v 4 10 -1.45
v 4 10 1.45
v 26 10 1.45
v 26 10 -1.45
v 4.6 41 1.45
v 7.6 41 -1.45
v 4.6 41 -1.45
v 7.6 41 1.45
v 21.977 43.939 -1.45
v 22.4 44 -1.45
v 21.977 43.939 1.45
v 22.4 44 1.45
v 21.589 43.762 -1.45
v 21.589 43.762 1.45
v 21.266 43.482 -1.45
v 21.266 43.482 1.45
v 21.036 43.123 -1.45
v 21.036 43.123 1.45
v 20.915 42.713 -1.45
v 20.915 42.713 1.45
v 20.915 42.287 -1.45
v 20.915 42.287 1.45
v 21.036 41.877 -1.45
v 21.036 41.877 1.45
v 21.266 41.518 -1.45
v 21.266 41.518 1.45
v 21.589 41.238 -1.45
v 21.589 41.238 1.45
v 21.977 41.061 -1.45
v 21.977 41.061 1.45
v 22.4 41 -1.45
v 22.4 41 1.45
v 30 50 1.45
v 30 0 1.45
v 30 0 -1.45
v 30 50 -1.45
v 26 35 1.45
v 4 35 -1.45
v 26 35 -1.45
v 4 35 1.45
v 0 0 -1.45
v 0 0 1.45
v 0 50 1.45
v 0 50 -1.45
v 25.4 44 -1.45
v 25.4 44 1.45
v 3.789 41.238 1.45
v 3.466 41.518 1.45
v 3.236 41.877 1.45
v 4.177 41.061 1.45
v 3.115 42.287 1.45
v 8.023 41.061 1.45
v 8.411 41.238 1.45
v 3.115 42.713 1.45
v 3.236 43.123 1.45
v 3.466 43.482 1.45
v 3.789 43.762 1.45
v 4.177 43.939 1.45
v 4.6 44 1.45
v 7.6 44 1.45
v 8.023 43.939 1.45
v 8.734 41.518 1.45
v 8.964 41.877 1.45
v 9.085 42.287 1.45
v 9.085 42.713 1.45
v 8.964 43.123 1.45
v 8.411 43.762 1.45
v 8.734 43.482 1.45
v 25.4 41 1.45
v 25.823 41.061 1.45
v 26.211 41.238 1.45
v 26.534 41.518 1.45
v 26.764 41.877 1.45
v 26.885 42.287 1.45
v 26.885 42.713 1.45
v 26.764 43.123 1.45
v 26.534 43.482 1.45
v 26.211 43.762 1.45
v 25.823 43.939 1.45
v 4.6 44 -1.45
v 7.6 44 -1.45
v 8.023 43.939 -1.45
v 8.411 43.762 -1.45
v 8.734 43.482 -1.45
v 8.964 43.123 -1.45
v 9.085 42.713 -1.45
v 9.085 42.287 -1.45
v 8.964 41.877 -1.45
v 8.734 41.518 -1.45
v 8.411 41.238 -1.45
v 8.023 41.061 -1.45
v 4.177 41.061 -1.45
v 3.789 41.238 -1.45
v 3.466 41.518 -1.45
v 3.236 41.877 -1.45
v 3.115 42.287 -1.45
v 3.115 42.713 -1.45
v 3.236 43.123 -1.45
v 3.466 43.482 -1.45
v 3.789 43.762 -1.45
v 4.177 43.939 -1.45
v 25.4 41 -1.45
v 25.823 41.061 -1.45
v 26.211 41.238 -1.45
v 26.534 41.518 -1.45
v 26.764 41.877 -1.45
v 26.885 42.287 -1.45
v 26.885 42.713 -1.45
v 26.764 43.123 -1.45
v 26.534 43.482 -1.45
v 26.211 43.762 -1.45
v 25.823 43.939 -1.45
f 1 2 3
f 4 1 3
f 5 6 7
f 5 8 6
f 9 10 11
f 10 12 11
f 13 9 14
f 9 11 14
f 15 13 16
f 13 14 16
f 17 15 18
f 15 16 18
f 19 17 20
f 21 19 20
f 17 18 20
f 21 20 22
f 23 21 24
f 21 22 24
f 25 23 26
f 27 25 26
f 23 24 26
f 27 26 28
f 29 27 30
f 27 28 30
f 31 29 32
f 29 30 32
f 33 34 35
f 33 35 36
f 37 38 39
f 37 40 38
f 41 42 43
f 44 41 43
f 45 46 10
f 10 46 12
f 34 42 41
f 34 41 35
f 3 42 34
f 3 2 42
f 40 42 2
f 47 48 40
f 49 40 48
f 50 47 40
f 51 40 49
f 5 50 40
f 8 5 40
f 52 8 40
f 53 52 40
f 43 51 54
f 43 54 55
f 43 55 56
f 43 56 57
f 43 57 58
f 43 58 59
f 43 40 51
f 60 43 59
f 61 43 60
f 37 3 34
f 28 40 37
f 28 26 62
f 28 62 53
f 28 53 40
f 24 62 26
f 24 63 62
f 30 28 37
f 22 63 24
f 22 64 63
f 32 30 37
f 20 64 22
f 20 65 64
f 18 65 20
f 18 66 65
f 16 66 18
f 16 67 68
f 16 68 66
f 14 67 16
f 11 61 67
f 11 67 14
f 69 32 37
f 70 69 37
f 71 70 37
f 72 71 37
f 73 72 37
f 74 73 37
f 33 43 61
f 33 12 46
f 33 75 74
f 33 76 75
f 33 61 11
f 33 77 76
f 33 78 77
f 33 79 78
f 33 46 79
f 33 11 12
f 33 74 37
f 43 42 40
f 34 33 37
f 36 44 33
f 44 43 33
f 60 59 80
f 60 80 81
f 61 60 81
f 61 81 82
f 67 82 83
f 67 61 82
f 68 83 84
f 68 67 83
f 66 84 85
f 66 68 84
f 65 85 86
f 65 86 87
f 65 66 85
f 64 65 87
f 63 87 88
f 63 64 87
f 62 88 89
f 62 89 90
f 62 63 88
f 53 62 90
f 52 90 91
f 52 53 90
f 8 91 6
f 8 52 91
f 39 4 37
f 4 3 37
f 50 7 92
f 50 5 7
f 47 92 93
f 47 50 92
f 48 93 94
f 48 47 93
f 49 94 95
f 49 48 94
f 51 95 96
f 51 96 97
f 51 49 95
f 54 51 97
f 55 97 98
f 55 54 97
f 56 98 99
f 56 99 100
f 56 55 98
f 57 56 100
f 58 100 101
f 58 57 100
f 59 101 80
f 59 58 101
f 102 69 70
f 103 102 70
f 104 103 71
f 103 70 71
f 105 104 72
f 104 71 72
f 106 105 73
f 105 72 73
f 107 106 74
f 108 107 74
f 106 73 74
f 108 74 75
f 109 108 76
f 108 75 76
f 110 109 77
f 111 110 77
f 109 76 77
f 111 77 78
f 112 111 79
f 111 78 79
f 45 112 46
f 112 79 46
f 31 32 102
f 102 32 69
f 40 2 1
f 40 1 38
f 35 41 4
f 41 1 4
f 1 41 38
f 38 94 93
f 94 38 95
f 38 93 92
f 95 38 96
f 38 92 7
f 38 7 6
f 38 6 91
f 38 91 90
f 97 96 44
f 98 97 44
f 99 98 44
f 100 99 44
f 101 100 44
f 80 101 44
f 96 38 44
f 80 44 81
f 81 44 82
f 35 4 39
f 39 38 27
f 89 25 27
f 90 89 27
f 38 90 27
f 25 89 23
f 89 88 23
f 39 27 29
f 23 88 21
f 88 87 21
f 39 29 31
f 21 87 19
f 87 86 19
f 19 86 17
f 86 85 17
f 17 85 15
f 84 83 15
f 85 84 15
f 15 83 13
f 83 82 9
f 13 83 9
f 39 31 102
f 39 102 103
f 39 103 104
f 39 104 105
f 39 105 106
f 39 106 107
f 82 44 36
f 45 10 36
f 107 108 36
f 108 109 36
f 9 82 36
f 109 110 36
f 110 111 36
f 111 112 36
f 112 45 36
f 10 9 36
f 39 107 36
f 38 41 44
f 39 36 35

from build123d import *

# Parameters (mm, degrees)
SKETCH1_W           = 30
SKETCH1_H           = 50
SKETCH1_W_2         = 22
SKETCH1_H_2         = 25
BOSS_EXTRUDE1_DEPTH = 1.45


with BuildPart() as part:
    # Sketch1 → Boss-Extrude1 (new, symmetric)
    with BuildSketch(Plane.XY):
        with Locations((15, 25)):
            Rectangle(SKETCH1_W, SKETCH1_H)
        with BuildLine():
            Line((4.6, 44), (7.6, 44))
            ThreePointArc((7.6, 44), (9.1, 42.5), (7.6, 41))
            Line((7.6, 41), (4.6, 41))
            ThreePointArc((4.6, 41), (3.1, 42.5), (4.6, 44))
        make_face(mode=Mode.SUBTRACT)
        with BuildLine():
            Line((25.4, 44), (22.4, 44))
            ThreePointArc((22.4, 44), (20.9, 42.5), (22.4, 41))
            Line((22.4, 41), (25.4, 41))
            ThreePointArc((25.4, 41), (26.9, 42.5), (25.4, 44))
        make_face(mode=Mode.SUBTRACT)
        with Locations((15, 22.5)):
            Rectangle(SKETCH1_W_2, SKETCH1_H_2, mode=Mode.SUBTRACT)
    extrude(amount=BOSS_EXTRUDE1_DEPTH, both=True)


solid = part.part
